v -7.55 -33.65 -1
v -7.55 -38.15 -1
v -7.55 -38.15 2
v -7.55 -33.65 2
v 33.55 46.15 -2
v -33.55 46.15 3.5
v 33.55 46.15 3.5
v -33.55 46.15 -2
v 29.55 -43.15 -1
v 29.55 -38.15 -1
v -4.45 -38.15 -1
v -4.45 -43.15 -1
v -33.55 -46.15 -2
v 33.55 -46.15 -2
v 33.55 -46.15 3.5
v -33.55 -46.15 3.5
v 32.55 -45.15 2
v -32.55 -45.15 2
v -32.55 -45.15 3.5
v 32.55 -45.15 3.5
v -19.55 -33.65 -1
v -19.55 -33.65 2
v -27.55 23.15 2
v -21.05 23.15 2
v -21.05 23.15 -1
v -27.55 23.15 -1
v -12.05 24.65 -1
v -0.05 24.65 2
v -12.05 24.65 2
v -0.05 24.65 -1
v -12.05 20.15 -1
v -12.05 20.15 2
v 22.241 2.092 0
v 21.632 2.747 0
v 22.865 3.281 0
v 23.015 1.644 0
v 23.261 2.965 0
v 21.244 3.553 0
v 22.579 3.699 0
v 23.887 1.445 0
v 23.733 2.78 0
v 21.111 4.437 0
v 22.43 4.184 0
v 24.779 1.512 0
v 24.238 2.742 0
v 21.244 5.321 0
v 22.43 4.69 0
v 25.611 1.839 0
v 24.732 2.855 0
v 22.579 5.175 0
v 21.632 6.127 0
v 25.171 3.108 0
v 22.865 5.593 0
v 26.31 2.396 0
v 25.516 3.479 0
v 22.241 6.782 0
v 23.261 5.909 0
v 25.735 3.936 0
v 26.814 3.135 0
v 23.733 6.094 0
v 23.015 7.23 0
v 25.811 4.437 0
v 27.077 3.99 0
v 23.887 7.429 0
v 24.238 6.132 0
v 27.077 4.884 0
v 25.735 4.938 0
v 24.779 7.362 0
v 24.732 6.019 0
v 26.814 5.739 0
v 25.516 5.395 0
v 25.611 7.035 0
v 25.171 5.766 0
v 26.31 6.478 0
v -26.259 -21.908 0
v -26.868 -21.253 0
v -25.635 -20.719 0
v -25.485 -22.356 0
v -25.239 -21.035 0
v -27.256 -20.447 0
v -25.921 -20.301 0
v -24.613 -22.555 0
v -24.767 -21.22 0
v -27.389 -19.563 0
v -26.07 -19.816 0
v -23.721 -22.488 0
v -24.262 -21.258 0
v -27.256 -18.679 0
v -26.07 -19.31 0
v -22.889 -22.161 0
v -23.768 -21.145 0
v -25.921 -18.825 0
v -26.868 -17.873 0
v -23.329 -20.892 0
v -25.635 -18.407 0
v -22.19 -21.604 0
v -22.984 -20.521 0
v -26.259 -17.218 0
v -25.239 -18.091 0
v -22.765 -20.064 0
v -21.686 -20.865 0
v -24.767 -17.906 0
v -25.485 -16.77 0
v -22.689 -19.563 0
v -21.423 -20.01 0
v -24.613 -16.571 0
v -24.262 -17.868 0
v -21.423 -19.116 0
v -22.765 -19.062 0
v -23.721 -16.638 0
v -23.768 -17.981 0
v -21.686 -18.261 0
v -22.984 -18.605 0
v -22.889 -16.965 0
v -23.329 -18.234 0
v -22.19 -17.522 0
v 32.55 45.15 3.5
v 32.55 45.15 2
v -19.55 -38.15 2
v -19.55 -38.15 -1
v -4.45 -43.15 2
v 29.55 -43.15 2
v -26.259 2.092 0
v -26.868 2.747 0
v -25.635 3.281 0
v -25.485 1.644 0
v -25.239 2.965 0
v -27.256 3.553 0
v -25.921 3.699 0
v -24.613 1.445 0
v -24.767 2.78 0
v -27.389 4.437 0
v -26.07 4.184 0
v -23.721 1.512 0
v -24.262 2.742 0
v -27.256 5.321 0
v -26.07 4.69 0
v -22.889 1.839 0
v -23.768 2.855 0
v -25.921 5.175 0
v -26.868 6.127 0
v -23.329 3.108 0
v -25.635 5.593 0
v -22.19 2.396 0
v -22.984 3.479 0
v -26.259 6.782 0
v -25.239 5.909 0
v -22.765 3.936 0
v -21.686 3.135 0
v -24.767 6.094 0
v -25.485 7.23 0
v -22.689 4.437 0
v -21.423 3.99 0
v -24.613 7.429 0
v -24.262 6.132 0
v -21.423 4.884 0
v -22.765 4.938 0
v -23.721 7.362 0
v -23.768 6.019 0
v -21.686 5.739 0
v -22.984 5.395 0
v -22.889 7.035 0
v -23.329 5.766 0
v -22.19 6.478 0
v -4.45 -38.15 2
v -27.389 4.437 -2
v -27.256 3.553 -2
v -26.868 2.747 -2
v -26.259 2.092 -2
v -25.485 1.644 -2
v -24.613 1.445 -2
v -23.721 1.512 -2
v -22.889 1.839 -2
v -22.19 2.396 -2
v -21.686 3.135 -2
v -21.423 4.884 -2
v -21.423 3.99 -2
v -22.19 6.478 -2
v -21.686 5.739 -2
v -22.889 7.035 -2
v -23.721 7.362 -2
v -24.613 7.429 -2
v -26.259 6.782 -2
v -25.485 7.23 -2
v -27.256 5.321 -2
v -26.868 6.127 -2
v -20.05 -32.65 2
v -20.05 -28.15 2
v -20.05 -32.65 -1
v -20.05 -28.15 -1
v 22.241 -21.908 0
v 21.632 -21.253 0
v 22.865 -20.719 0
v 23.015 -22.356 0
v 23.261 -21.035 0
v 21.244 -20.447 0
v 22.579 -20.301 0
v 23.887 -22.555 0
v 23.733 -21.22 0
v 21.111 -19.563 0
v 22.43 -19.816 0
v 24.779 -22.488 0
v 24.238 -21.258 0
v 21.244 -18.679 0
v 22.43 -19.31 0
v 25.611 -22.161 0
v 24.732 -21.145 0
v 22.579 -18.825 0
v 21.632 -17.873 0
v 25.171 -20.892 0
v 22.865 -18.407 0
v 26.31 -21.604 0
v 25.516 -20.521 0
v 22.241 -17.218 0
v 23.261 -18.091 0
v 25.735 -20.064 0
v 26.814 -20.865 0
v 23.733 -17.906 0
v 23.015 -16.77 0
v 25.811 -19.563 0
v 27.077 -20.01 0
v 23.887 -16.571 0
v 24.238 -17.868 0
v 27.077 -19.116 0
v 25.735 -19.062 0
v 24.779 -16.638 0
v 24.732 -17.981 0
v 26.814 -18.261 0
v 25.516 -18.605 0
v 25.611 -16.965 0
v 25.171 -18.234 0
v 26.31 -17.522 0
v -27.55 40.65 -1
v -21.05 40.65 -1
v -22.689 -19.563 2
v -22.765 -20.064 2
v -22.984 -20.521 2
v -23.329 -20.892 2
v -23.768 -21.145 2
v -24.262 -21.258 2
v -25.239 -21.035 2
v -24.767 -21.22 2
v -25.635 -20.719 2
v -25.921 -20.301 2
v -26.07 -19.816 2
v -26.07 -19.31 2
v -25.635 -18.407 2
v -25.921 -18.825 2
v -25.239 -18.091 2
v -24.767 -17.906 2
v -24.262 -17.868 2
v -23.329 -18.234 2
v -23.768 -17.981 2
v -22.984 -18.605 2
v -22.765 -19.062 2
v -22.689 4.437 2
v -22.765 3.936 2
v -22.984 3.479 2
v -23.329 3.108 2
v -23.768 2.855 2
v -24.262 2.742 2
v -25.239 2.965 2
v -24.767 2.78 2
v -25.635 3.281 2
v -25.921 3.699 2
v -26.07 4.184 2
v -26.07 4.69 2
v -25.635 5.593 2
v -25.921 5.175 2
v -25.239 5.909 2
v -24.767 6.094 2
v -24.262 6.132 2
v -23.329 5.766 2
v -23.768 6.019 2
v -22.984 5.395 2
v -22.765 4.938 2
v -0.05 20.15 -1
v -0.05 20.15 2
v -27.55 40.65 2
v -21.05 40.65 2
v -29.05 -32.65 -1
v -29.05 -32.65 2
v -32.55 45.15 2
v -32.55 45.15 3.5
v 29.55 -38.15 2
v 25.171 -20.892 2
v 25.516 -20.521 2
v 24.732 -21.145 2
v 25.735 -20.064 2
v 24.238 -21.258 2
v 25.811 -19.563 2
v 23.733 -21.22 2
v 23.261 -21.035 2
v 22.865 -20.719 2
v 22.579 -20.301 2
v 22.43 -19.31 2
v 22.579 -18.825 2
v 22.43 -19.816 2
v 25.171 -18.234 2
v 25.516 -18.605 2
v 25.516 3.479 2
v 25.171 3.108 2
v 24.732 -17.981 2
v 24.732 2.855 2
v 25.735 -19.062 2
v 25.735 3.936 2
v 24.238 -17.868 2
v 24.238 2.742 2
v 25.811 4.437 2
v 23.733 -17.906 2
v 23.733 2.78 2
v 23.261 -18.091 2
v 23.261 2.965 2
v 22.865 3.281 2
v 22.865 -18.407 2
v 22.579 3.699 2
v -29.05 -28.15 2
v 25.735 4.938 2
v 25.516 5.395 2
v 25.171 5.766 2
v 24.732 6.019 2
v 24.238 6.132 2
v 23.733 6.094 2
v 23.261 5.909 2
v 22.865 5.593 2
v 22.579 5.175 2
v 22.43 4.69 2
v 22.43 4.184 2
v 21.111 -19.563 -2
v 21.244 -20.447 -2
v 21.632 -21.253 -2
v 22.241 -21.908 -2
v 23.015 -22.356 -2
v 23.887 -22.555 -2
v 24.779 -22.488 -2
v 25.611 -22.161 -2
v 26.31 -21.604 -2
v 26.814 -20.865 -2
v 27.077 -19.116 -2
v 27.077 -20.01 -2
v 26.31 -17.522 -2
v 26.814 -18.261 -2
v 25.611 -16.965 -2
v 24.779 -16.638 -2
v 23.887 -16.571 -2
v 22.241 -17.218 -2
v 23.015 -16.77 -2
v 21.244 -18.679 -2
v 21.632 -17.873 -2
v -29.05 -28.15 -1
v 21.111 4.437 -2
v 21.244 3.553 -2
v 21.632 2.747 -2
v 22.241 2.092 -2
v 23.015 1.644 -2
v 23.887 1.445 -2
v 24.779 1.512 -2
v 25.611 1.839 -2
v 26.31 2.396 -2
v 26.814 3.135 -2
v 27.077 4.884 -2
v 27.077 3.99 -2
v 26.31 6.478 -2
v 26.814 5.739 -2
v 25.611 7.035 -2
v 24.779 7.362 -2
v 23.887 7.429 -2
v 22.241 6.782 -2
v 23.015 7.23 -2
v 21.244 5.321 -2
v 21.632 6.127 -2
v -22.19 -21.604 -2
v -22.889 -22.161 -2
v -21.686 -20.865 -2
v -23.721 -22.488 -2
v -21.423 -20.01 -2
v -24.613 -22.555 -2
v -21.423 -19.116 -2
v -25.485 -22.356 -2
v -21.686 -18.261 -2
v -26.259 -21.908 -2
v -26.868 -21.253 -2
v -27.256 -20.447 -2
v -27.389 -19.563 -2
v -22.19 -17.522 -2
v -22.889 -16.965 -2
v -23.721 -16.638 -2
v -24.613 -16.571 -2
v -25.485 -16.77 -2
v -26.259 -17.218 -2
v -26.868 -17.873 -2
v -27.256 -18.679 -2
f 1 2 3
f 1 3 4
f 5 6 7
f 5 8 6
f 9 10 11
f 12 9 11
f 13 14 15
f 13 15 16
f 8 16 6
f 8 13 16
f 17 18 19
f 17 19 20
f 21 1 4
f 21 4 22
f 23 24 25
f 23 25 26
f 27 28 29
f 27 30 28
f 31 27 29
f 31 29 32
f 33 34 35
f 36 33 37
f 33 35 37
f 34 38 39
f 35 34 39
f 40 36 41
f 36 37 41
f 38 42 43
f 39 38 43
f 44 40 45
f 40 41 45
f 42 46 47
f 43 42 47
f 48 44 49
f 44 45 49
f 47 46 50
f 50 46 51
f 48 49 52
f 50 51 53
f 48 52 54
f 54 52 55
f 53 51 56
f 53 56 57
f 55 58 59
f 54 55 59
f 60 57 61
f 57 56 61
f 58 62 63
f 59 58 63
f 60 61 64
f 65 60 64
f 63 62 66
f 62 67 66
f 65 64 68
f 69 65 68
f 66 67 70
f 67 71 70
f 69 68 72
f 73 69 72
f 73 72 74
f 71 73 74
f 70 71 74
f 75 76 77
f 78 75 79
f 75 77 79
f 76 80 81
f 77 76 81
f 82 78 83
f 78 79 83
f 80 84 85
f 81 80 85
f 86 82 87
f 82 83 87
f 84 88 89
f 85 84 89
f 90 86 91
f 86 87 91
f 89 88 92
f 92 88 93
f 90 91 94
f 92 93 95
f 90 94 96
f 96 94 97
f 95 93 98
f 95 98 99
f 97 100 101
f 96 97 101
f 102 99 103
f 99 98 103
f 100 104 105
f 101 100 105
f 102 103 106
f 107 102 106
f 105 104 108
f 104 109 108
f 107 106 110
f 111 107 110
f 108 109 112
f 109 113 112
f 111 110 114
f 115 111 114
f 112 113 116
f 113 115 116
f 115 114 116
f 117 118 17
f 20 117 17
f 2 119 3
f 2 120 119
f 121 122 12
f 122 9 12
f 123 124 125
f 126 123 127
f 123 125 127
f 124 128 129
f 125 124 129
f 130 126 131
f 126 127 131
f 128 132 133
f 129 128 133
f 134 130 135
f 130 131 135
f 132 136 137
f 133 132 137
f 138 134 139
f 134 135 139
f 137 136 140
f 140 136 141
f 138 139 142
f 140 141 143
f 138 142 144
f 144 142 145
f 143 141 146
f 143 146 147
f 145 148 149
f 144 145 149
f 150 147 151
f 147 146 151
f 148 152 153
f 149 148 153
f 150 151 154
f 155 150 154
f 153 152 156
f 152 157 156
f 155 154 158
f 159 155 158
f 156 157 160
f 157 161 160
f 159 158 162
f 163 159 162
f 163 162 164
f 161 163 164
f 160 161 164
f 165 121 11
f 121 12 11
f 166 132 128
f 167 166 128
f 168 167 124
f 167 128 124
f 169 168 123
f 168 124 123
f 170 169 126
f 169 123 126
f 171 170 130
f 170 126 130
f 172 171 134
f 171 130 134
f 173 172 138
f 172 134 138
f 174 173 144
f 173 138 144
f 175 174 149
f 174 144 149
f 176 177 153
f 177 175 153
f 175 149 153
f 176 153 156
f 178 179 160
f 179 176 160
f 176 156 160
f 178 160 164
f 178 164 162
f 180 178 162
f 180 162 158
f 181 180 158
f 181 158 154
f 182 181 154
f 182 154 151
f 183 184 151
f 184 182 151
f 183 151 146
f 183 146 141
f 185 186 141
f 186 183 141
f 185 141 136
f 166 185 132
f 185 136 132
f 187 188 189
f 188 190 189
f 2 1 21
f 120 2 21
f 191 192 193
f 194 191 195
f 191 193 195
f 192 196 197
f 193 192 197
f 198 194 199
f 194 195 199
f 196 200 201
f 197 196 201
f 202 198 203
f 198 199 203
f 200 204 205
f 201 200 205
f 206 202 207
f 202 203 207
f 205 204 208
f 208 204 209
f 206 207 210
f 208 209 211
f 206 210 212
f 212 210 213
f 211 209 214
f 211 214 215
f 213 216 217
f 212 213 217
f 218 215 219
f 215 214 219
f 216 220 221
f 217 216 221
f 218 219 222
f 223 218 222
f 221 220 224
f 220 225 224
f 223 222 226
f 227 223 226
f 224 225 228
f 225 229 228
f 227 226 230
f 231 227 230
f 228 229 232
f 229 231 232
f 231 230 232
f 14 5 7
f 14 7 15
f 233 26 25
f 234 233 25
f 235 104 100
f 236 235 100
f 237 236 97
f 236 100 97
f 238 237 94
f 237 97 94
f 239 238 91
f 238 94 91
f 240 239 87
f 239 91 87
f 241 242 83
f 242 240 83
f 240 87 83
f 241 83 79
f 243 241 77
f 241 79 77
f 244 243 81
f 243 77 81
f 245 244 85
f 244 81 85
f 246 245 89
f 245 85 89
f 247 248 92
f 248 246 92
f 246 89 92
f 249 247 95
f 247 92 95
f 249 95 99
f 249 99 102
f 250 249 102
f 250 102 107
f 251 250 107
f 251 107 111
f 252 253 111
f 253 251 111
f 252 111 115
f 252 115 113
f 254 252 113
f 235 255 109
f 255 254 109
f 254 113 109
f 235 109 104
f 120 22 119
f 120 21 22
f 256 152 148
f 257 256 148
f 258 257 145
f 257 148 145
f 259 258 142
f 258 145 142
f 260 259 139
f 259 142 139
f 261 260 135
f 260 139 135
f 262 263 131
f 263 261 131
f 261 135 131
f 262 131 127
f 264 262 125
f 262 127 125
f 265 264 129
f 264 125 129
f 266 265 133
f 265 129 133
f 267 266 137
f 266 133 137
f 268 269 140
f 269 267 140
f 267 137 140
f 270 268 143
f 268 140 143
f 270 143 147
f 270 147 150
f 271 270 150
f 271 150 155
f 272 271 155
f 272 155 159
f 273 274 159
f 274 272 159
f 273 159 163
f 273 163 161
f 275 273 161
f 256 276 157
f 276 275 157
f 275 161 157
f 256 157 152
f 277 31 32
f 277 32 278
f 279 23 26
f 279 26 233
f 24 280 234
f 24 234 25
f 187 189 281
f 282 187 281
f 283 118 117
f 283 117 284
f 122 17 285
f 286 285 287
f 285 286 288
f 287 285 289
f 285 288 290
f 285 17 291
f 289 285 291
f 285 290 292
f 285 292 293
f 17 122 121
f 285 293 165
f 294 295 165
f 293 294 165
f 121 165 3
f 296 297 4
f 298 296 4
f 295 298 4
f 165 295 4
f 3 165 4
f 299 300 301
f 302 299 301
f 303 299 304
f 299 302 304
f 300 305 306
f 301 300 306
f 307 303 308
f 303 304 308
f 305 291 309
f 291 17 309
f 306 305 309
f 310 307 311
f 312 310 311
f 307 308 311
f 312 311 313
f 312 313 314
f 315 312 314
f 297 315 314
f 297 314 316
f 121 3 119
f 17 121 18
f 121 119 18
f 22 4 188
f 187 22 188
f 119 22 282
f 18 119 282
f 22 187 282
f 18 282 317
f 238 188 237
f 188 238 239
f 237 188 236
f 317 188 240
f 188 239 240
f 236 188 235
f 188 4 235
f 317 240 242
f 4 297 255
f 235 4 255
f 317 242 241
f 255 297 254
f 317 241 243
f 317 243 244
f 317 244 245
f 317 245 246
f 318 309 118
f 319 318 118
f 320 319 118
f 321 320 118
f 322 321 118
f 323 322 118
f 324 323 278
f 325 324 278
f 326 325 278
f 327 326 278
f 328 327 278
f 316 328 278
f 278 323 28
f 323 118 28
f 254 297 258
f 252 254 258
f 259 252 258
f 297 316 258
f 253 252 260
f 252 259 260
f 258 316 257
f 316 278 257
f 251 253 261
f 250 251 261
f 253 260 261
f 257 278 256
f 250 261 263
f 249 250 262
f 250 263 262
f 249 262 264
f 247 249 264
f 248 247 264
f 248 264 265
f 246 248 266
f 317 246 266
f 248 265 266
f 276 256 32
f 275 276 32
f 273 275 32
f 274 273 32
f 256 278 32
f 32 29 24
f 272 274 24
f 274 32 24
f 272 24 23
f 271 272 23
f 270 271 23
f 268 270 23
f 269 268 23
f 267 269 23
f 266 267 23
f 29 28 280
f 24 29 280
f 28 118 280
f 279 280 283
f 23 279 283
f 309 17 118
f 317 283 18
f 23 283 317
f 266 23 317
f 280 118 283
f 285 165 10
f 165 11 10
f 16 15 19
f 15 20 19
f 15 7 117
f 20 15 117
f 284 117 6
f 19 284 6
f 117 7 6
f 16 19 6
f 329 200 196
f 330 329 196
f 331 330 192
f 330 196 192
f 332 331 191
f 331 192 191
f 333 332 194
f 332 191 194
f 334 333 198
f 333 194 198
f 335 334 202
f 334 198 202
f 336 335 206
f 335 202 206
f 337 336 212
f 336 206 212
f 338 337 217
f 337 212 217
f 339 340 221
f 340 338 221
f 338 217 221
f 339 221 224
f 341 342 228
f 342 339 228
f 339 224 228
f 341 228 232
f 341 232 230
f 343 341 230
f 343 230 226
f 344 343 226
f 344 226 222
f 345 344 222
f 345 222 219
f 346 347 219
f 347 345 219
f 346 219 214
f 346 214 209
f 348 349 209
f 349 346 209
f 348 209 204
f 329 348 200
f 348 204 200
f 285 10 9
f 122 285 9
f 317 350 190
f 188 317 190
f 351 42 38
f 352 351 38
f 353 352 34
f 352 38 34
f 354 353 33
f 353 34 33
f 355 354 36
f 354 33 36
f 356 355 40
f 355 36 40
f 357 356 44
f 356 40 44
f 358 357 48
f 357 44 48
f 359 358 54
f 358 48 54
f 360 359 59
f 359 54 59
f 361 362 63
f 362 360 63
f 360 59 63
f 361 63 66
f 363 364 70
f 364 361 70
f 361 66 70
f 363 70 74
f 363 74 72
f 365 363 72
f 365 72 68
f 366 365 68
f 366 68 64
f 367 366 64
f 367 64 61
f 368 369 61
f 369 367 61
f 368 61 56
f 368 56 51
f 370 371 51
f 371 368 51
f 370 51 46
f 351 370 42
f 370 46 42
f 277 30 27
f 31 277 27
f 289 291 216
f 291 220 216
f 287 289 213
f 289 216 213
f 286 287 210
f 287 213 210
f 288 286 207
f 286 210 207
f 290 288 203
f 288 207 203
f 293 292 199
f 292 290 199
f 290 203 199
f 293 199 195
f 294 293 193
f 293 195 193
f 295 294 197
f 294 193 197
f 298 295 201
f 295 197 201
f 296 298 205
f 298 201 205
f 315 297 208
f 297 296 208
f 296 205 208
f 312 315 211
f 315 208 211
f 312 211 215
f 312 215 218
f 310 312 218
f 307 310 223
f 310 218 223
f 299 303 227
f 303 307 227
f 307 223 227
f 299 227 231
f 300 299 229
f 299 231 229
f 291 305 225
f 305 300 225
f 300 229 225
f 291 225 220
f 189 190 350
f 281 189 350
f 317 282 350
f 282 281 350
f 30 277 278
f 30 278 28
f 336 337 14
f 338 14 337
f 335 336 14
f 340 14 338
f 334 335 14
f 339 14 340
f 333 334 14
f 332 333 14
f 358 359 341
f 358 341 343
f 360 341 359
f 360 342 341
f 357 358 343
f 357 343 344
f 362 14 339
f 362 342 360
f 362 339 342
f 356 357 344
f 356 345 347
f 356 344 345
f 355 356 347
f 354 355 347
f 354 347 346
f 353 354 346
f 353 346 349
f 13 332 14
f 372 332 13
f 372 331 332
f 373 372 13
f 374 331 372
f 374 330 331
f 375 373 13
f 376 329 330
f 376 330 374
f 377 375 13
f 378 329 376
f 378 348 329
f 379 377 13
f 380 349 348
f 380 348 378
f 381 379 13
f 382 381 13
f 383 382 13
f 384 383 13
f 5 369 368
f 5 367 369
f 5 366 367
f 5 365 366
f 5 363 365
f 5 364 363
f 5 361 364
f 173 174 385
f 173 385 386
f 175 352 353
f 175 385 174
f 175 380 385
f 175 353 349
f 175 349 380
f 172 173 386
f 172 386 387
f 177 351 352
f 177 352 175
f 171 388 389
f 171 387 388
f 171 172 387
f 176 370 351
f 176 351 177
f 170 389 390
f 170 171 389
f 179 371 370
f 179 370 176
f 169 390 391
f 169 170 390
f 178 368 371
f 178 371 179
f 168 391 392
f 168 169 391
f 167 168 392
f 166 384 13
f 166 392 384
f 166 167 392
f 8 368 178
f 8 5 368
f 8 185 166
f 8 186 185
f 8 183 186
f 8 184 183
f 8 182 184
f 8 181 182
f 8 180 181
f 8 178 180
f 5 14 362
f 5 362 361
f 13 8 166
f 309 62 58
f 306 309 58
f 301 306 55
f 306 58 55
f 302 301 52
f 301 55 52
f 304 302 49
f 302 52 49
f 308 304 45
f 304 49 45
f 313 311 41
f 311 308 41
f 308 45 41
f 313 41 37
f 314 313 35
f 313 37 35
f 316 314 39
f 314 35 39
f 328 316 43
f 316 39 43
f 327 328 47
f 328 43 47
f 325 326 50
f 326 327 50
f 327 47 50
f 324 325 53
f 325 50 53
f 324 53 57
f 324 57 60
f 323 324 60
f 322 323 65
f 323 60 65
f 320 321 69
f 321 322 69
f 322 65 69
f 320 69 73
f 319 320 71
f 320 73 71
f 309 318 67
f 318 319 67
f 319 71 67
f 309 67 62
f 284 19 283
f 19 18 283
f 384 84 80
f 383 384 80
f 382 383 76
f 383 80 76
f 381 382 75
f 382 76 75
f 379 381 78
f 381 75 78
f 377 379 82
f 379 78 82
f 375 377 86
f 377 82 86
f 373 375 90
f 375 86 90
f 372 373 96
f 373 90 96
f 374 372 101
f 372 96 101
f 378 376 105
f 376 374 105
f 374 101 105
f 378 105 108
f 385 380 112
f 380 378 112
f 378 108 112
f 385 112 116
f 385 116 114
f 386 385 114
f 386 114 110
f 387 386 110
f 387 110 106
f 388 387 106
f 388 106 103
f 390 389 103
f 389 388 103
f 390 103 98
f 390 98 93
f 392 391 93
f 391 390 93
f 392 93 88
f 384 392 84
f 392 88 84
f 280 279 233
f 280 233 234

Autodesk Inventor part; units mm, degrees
ref_plane "YZ Plane" through (0, 0, 0) normal (1, 0, 0) x (0, 1, 0)
ref_plane "XZ Plane" through (0, 0, 0) normal (0, 1, 0) x (-1, 0, 0)
ref_plane "XY Plane" through (0, 0, 0) normal (0, 0, 1) x (1, 0, 0)
sketch "草图1" plane through (0, 0, 0) normal (0, 0, 1) x (1, 0, 0)
  line L0 (32.05, -44.65) -> (-32.05, -44.65)
  line L1 (-32.05, -44.65) -> (-32.05, 44.65)
  line L2 (-32.05, 44.65) -> (32.05, 44.65)
  line L3 (32.05, 44.65) -> (32.05, -44.65)
  line L4 (32.05, -44.65) -> (-32.05, 44.65) construction
  line L5 (-32.05, -44.65) -> (32.05, 44.65) construction
  line L6 (24.111, -19.563) -> (-24.389, -19.563) construction
  line L7 (-24.389, -19.563) -> (-24.389, 4.437) construction
  line L8 (-24.389, 4.437) -> (24.111, 4.437) construction
  line L9 (24.111, 4.437) -> (24.111, -19.563) construction
  line L10 (24.111, -19.563) -> (-24.389, 4.437) construction
  line L11 (-24.389, -19.563) -> (24.111, 4.437) construction
  circle A0 centre (-24.389, 4.437) radius 1.7
  circle A1 centre (-24.389, -19.563) radius 1.7
  circle A2 centre (24.111, 4.437) radius 1.7
  circle A3 centre (24.111, -19.563) radius 1.7
  line L12 (29.55, -43.15) -> (-4.45, -43.15)
  line L13 (-4.45, -43.15) -> (-4.45, -38.15)
  line L14 (-4.45, -38.15) -> (29.55, -38.15)
  line L15 (29.55, -38.15) -> (29.55, -43.15)
  line L16 (-19.55, -38.15) -> (-7.55, -38.15)
  line L17 (-7.55, -38.15) -> (-7.55, -33.65)
  line L18 (-7.55, -33.65) -> (-19.55, -33.65)
  line L19 (-19.55, -33.65) -> (-19.55, -38.15)
  line L20 (-20.05, -32.65) -> (-29.05, -32.65)
  line L21 (-29.05, -32.65) -> (-29.05, -28.15)
  line L22 (-29.05, -28.15) -> (-20.05, -28.15)
  line L23 (-20.05, -28.15) -> (-20.05, -32.65)
  line L24 (-12.05, 20.15) -> (-0.05, 20.15)
  line L25 (-0.05, 20.15) -> (-0.05, 24.65)
  line L26 (-0.05, 24.65) -> (-12.05, 24.65)
  line L27 (-12.05, 24.65) -> (-12.05, 20.15)
  point P0 (0, 0)
  point P1 (-0.139, -7.563)
  point P2 (-20.05, -30.4)
  dimension "d0" = 64.1
  dimension "d1" = 89.3
  dimension "d2" = 48.5
  dimension "d3" = 24
  dimension "d4" = 52.213
  dimension "d5" = 37.087
  dimension "d6" = 32.189
  dimension "d7" = 31.911
  dimension "d8" = 3.4
  dimension "d16" = 6.5
  dimension "d20" = 24.5
  dimension "d21" = 36.5
  dimension "d22" = 12.5
  dimension "d23" = 11
  dimension "d24" = 6.5
  dimension "d25" = 2.5
  dimension "d26" = 1.5
  dimension "d27" = 12
  dimension "d28" = 12
  dimension "d29" = 3
  dimension "d30" = 16.5
  dimension "d31" = 32
  dimension "d32" = 20
  dimension "d33" = 24.5
  dimension "d34" = 20
extrude "拉伸1" add sketch "草图1" along normal blind 2
sketch "草图5" plane through (0, 0, 0) normal (0, 0, -1) x (-1, 0, 0)
  circle A0 centre (24.389, -19.563) radius 1.7 projected
  circle A1 centre (24.389, -19.563) radius 3
  circle A2 centre (24.389, 4.437) radius 1.7 projected
  circle A3 centre (24.389, 4.437) radius 3
  circle A4 centre (-24.111, -19.563) radius 1.7 projected
  circle A5 centre (-24.111, -19.563) radius 3
  circle A6 centre (-24.111, 4.437) radius 1.7 projected
  circle A7 centre (-24.111, 4.437) radius 3
  line L0 (-32.05, 44.65) -> (32.05, 44.65) projected
  line L1 (32.05, -44.65) -> (-32.05, -44.65)
  line L2 (-32.05, -44.65) -> (-32.05, 44.65)
  line L3 (-32.05, 44.65) -> (32.05, 44.65)
  line L4 (32.05, 44.65) -> (32.05, -44.65)
  line L5 (20.05, -32.65) -> (29.05, -32.65) projected
  line L6 (29.05, -28.15) -> (20.05, -28.15) projected
  line L7 (29.05, -32.65) -> (20.05, -32.65)
  line L8 (20.05, -32.65) -> (20.05, -28.15)
  line L9 (20.05, -28.15) -> (29.05, -28.15)
  line L10 (29.05, -28.15) -> (29.05, -32.65)
  line L11 (7.55, -38.15) -> (19.55, -38.15) projected
  line L12 (19.55, -38.15) -> (7.55, -38.15)
  line L13 (7.55, -38.15) -> (7.55, -33.65)
  line L14 (7.55, -33.65) -> (19.55, -33.65)
  line L15 (19.55, -33.65) -> (19.55, -38.15)
  line L16 (4.45, -43.15) -> (4.45, -38.15) projected
  line L17 (-29.55, -38.15) -> (-29.55, -43.15) projected
  line L18 (4.45, -43.15) -> (-29.55, -43.15)
  line L19 (-29.55, -43.15) -> (-29.55, -38.15)
  line L20 (-29.55, -38.15) -> (4.45, -38.15)
  line L21 (4.45, -38.15) -> (4.45, -43.15)
  line L22 (12.05, 24.65) -> (0.05, 24.65) projected
  line L23 (12.05, 20.15) -> (0.05, 20.15)
  line L24 (0.05, 20.15) -> (0.05, 24.65)
  line L25 (0.05, 24.65) -> (12.05, 24.65)
  line L26 (12.05, 24.65) -> (12.05, 20.15)
  point P0 (0, 0)
  dimension "d48" = 6
  dimension "d49" = 6
  dimension "d50" = 6
  dimension "d51" = 6
extrude "拉伸5" add sketch "草图5" along normal blind 1 contours L0 L4 L1 L2
sketch "草图6" plane through (0, 0, -1) normal (0, 0, -1) x (-1, 0, 0)
  line L0 (-32.05, 44.65) -> (32.05, 44.65) projected
  line L1 (32.05, -44.65) -> (-32.05, -44.65)
  line L2 (-32.05, -44.65) -> (-32.05, 44.65)
  line L3 (-32.05, 44.65) -> (32.05, 44.65)
  line L4 (32.05, 44.65) -> (32.05, -44.65)
  circle A0 centre (24.389, -19.563) radius 3 projected
  circle A1 centre (24.389, -19.563) radius 3
  circle A2 centre (24.389, 4.437) radius 3 projected
  circle A3 centre (24.389, 4.437) radius 3
  circle A4 centre (-24.111, -19.563) radius 1.7 projected
  circle A5 centre (-24.111, -19.563) radius 3
  circle A6 centre (-24.111, 4.437) radius 1.7 projected
  circle A7 centre (-24.111, 4.437) radius 3
  point P0 (0, 0)
extrude "拉伸6" add sketch "草图6" along normal blind 1 contours L0 L4 L1 L2
sketch "草图7" plane through (0, 0, 2) normal (0, 0, 1) x (1, 0, 0)
  line L0 (32.05, 44.65) -> (-32.05, 44.65) construction
  line L1 (32.05, 44.65) -> (-32.05, 44.65) construction
  line L2 (-32.05, 44.65) -> (-32.05, -44.65) construction
  line L3 (-32.05, -44.65) -> (32.05, -44.65) construction
  line L4 (32.05, -44.65) -> (32.05, 44.65) construction
  line L5 (-27.55, 40.65) -> (-21.05, 40.65)
  line L6 (-21.05, 40.65) -> (-21.05, 23.15)
  line L7 (-21.05, 23.15) -> (-27.55, 23.15)
  line L8 (-27.55, 23.15) -> (-27.55, 40.65)
  point P0 (0, 0)
  point P1 (-21.05, 31.9)
  dimension "d56" = 4.5
  dimension "d58" = 4
  dimension "d59" = 21.5
  dimension "d68" = 6.5
extrude "拉伸7" cut sketch "草图7" against normal blind 3
sketch "草图8" plane through (0, 0, -2) normal (0, 0, -1) x (-1, 0, 0)
  line L0 (32.05, 44.65) -> (32.05, -44.65) projected
  line L1 (-32.05, -44.65) -> (-32.05, 44.65) projected
  line L2 (32.05, 44.65) -> (-32.05, 44.65)
  line L3 (-32.05, 44.65) -> (-32.05, -44.65)
  line L4 (-32.05, -44.65) -> (32.05, -44.65)
  line L5 (32.05, -44.65) -> (32.05, 44.65)
  line L6 (-32.55, 45.15) -> (32.55, 45.15)
  line L7 (32.55, 45.15) -> (32.55, -45.15)
  line L8 (32.55, -45.15) -> (-32.55, -45.15)
  line L9 (-32.55, -45.15) -> (-32.55, 45.15)
  point P0 (0, 0)
  dimension "d62" = 0.5
extrude "拉伸8" add sketch "草图8" against normal up to surface (4 mm away)
sketch "草图9" plane through (0, 0, -2) normal (0, 0, -1) x (-1, 0, 0)
  line L0 (-32.55, 45.15) -> (-32.55, -45.15) projected
  line L1 (32.55, -45.15) -> (32.55, 45.15) projected
  line L2 (-32.55, 45.15) -> (32.55, 45.15)
  line L3 (32.55, 45.15) -> (32.55, -45.15)
  line L4 (32.55, -45.15) -> (-32.55, -45.15)
  line L5 (-32.55, -45.15) -> (-32.55, 45.15)
  line L6 (33.55, 46.15) -> (-33.55, 46.15)
  line L7 (-33.55, 46.15) -> (-33.55, -46.15)
  line L8 (-33.55, -46.15) -> (33.55, -46.15)
  line L9 (33.55, -46.15) -> (33.55, 46.15)
  point P0 (0, 0)
  dimension "d65" = 1
extrude "拉伸9" add sketch "草图9" against normal blind 5.5
properties part number "TES_ESP32-Case"
